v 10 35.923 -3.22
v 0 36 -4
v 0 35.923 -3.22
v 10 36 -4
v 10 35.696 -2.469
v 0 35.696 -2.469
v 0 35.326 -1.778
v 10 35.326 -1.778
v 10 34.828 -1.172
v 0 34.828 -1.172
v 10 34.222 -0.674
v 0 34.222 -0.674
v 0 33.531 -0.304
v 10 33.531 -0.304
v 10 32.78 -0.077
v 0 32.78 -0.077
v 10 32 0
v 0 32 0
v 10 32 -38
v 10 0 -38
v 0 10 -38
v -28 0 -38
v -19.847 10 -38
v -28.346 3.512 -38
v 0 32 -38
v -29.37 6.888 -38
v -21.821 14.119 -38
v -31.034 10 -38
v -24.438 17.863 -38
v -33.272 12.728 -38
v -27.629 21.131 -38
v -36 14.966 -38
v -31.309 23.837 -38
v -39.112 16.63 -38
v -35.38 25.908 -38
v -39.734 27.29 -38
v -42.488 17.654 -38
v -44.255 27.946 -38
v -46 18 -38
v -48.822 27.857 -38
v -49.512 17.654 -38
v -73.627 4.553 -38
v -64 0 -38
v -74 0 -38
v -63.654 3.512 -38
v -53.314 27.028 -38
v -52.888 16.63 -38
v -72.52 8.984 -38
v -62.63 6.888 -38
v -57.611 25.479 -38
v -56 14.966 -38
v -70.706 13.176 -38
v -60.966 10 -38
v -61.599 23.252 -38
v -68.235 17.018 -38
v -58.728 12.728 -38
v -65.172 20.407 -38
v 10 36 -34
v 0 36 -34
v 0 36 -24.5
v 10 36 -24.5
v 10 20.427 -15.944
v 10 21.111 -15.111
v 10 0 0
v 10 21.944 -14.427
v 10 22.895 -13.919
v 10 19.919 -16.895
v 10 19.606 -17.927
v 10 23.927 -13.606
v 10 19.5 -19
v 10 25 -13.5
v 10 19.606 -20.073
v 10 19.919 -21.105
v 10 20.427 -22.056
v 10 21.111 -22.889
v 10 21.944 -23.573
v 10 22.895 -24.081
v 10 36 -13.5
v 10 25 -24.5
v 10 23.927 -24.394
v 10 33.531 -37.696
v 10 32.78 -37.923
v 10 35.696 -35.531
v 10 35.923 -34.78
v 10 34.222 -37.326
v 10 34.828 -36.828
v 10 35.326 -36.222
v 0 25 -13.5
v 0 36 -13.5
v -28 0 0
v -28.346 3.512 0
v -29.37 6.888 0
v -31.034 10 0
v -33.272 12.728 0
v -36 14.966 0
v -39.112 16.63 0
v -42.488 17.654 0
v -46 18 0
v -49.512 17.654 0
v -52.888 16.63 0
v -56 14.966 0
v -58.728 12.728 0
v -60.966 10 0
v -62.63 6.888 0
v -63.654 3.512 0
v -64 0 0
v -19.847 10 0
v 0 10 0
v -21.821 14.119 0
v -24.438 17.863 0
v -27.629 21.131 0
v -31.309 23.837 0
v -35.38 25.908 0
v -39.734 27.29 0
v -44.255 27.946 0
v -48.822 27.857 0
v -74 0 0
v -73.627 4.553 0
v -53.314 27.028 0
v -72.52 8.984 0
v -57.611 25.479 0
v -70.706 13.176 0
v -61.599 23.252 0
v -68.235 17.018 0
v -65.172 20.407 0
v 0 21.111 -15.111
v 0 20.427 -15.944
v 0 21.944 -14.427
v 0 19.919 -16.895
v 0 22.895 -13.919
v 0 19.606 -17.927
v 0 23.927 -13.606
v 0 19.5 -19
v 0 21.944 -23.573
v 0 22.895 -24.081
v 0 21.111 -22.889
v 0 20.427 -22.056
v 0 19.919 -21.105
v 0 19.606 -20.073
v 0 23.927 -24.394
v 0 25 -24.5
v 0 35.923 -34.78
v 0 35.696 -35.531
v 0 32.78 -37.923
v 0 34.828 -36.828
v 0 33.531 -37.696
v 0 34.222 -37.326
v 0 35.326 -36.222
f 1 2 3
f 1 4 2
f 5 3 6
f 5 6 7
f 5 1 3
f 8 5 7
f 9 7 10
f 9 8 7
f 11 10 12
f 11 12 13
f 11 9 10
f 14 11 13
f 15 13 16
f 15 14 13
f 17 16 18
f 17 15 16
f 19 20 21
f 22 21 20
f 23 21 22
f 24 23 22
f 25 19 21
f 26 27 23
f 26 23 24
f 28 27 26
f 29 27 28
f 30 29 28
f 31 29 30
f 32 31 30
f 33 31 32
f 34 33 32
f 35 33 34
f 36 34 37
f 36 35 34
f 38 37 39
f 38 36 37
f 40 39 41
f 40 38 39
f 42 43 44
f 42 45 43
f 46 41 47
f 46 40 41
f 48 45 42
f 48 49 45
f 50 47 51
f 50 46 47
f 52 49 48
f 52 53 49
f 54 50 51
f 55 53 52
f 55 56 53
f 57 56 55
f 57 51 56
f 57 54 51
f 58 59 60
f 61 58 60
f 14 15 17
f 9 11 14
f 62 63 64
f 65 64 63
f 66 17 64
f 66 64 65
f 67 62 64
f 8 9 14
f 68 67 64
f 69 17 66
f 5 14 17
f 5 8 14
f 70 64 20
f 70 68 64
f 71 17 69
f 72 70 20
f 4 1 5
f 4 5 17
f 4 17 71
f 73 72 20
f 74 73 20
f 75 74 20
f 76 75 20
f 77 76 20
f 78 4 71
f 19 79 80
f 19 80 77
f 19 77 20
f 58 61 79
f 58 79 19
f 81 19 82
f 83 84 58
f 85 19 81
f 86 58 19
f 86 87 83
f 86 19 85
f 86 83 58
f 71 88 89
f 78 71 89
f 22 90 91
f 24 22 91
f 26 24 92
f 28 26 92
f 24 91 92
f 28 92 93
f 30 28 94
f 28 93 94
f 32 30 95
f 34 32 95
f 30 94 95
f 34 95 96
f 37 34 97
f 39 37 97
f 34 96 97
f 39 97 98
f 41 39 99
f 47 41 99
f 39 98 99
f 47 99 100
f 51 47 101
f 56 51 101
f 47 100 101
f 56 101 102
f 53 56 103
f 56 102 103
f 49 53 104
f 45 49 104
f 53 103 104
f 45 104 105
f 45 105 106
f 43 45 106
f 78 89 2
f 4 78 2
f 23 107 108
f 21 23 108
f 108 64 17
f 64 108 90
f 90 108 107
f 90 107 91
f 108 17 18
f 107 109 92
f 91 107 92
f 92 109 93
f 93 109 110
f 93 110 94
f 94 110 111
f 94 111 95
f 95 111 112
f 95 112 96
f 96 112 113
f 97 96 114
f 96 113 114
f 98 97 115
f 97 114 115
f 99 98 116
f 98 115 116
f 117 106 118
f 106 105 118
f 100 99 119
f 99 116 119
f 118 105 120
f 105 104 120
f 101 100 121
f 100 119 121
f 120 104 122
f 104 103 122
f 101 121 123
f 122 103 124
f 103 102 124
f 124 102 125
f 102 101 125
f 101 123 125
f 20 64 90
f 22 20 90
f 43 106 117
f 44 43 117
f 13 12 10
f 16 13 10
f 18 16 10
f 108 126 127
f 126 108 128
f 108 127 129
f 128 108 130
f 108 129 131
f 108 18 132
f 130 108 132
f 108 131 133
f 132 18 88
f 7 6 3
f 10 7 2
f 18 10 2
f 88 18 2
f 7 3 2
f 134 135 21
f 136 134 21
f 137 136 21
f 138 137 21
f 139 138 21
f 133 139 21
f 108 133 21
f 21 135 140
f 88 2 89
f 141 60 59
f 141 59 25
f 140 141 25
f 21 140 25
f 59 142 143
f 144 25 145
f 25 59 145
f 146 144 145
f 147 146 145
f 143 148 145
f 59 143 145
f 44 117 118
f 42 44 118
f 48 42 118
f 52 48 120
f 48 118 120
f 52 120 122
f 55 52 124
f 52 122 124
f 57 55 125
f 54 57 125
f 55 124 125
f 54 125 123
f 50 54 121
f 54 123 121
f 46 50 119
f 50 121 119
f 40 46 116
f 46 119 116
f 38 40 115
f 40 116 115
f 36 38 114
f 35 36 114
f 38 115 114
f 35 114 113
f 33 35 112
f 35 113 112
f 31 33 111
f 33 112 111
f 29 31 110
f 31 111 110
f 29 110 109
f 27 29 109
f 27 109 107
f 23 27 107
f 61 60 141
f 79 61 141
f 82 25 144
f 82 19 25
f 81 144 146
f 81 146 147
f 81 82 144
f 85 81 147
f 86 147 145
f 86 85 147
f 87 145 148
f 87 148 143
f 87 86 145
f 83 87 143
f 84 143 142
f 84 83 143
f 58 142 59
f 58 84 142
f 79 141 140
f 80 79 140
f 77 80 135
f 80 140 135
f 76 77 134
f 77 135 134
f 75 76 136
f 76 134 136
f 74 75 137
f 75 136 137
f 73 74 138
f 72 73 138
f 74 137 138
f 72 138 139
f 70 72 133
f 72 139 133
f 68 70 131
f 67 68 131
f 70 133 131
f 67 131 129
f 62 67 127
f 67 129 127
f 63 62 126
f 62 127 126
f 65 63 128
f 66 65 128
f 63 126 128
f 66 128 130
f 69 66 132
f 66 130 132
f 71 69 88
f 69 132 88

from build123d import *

# Parameters (mm, degrees)
EXTRUDE_1_DEPTH = 10
FILLET_1_R      = 4
EXTRUDE_2_DEPTH = 38


with BuildPart() as part:
    # 草圖1 → 填料-伸長1 (new body)
    with BuildSketch(Plane(origin=(0, 0, 0), x_dir=(0, 0, -1), z_dir=(1, 0, 0))):
        with BuildLine():
            Line((0, 0), (38, 0))
            Line((38, 0), (38, 36))
            Line((38, 36), (24.5, 36))
            Line((24.5, 36), (24.5, 25))
            ThreePointArc((24.5, 25), (19, 19.5), (13.5, 25))
            Line((13.5, 25), (13.5, 36))
            Line((13.5, 36), (0, 36))
            Line((0, 36), (0, 0))
        make_face()
    extrude(amount=EXTRUDE_1_DEPTH)

    # 圓角1
    fillet_1_edges = [part.edges().sort_by_distance(p)[0] for p in [
        (5, 36, 0),
        (5, 36, -38),
    ]]
    fillet(fillet_1_edges, radius=FILLET_1_R)

    # 草圖2 → 填料-伸長2 (add)
    with BuildSketch(Plane.XY):
        with BuildLine():
            Line((-64, 0), (-74, 0))
            ThreePointArc((-74, 0), (-51.08453427, 27.534478591), (-19.846606339, 10))
            Line((-19.846606339, 10), (0, 10))
            Line((0, 10), (0, 0))
            Line((0, 0), (-28, 0))
            ThreePointArc((-28, 0), (-46, 18), (-64, 0))
        make_face()
    extrude(amount=-EXTRUDE_2_DEPTH)


solid = part.part
